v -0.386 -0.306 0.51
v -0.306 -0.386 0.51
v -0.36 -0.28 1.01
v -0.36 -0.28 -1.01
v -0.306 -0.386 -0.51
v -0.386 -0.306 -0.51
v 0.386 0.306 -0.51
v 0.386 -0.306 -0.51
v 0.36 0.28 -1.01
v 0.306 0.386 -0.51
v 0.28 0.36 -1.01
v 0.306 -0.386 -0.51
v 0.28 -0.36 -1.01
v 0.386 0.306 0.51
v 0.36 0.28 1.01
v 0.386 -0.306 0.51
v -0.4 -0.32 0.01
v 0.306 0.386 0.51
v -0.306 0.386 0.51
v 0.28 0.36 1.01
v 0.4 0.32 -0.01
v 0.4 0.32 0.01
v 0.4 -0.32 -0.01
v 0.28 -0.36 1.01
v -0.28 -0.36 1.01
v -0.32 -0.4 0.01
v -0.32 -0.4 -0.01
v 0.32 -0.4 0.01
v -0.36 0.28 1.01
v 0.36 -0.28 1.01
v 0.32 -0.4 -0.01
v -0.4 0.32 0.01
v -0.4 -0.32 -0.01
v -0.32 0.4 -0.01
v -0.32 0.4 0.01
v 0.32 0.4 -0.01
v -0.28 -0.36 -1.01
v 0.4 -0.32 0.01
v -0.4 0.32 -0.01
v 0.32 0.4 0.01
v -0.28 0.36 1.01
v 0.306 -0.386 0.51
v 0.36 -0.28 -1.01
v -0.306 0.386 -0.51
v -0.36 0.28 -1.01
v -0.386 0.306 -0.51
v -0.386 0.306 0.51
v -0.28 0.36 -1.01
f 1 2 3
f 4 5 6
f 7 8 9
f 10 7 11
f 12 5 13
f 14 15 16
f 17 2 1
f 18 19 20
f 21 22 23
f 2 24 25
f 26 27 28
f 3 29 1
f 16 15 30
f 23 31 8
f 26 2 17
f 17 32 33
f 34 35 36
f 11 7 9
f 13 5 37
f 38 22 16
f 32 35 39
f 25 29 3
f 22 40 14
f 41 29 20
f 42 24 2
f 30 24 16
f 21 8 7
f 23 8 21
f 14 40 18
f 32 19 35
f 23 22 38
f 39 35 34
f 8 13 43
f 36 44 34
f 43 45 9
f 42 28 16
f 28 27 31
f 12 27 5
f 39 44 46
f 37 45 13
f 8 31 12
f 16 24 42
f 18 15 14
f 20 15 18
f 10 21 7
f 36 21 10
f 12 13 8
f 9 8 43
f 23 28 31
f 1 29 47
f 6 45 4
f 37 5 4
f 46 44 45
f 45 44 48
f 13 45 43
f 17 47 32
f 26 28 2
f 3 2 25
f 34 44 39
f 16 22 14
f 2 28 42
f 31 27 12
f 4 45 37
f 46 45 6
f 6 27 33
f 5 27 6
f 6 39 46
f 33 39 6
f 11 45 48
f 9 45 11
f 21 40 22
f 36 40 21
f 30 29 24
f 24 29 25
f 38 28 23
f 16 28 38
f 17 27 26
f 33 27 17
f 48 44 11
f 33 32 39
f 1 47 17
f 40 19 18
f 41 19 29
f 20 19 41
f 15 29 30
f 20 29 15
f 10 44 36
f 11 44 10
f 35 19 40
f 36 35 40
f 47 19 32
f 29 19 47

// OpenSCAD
// Chamfered spacer block with mid-length bulge (wider at center, narrower at ends)
// Bounding box: 0.8 x 0.8 x 2.0 mm

$fn = 64;

// Parameters (mm)
L       = 2.0;   // length (Z)
W_max   = 0.8;   // max width at mid (X)
D_max   = 0.8;   // max depth at mid (Y)
W_end   = 0.72;  // width at ends (Z = +/- L/2)
D_end   = 0.72;  // depth at ends (Z = +/- L/2)
chamfer = 0.08;  // vertical edge bevel amount (corner cut in plan)
overlap = 0.02;  // small thickness for hull slices (robust)

// Clamp chamfer so it can't invert geometry
ch = min(chamfer, min(W_end, D_end, W_max, D_max)/2 - 0.001);

// 2D chamfered rectangle (flat sides + beveled corners)
module chamfered_rect_2d(w, d, c) {
    polygon(points=[
        [ w/2 - c,  d/2],
        [-w/2 + c,  d/2],
        [-w/2,      d/2 - c],
        [-w/2,     -d/2 + c],
        [-w/2 + c, -d/2],
        [ w/2 - c, -d/2],
        [ w/2,     -d/2 + c],
        [ w/2,      d/2 - c]
    ]);
}

// Main solid: tapered ends + bulged mid, with vertical edge chamfers
module spacer_block() {
    // Use hull between multiple Z cross-sections to make the lengthwise taper
    // clearly visible in orthographic side views.
    hull() {
        // bottom end
        translate([0,0,-L/2])
            linear_extrude(height=overlap, center=true)
                chamfered_rect_2d(W_end, D_end, ch);

        // lower shoulder (helps show taper)
        translate([0,0,-L/4])
            linear_extrude(height=overlap, center=true)
                chamfered_rect_2d(
                    W_end + (W_max - W_end)*0.65,
                    D_end + (D_max - D_end)*0.65,
                    ch
                );

        // mid bulge
        translate([0,0,0])
            linear_extrude(height=overlap, center=true)
                chamfered_rect_2d(W_max, D_max, ch);

        // upper shoulder
        translate([0,0, L/4])
            linear_extrude(height=overlap, center=true)
                chamfered_rect_2d(
                    W_end + (W_max - W_end)*0.65,
                    D_end + (D_max - D_end)*0.65,
                    ch
                );

        // top end
        translate([0,0, L/2])
            linear_extrude(height=overlap, center=true)
                chamfered_rect_2d(W_end, D_end, ch);
    }
}

spacer_block();
